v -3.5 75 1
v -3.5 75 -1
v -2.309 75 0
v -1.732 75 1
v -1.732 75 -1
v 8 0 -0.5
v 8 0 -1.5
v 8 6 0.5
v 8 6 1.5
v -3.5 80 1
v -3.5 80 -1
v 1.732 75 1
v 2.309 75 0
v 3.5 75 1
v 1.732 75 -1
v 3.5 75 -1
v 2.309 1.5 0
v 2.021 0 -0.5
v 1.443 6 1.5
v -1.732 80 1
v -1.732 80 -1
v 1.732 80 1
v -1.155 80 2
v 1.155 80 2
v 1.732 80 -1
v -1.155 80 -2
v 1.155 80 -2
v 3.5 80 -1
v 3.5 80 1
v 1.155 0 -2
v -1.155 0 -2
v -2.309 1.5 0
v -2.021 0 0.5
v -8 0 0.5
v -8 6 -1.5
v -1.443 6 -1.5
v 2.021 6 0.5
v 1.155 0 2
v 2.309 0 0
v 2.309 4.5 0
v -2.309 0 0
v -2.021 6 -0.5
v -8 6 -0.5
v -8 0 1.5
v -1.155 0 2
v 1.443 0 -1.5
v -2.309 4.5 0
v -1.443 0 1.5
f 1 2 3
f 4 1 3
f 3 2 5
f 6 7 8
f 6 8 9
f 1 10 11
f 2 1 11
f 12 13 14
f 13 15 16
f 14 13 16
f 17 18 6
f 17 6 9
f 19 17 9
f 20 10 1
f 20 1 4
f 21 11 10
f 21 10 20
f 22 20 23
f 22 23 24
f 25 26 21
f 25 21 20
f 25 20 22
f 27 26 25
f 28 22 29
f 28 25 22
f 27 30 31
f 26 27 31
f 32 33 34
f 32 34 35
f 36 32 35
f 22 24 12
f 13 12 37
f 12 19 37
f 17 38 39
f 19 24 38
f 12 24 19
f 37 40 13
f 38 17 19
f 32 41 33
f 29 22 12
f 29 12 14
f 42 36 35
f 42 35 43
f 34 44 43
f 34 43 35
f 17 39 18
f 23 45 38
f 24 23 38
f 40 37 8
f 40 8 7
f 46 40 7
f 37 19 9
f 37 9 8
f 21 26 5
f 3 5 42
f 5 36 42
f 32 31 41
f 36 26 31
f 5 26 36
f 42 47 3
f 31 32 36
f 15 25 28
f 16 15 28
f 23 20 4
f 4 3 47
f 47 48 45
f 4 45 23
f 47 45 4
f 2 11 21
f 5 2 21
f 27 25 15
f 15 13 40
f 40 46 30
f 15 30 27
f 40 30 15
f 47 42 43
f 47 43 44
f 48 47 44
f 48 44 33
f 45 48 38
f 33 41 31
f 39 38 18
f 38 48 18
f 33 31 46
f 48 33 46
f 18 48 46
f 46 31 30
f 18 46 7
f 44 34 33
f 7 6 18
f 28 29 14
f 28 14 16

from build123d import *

# Parameters (mm, degrees)
BOSS_EXTRUDE1_DEPTH = 80
SKETCH2_W           = 7
SKETCH2_H           = 2
BOSS_EXTRUDE2_DEPTH = 5
BOSS_EXTRUDE3_DEPTH = 8
BOSS_EXTRUDE4_DEPTH = 8


with BuildPart() as part:
    # Sketch1 → Boss-Extrude1 (new body)
    with BuildSketch(Plane(origin=(0, 0, 0), x_dir=(1, 0, 0), z_dir=(0, 1, 0))):
        Polygon((-1.154700538, 2), (-2.309401077, 0), (-1.154700538, -2), (1.154700538, -2), (2.309401077, 0), (1.154700538, 2), align=None)
    extrude(amount=BOSS_EXTRUDE1_DEPTH)

    # Sketch2 → Boss-Extrude2 (add)
    with BuildSketch(Plane(origin=(0, 80, 0), x_dir=(1, 0, 0), z_dir=(0, 1, 0))):
        Rectangle(SKETCH2_W, SKETCH2_H)
    extrude(amount=-BOSS_EXTRUDE2_DEPTH)

    # Sketch3 → Boss-Extrude3 (add)
    with BuildSketch(Plane(origin=(0, 0, 0), x_dir=(0, 0, -1), z_dir=(1, 0, 0))):
        Polygon((-1.5, 6), (-0.5, 6), (1.5, 0), (0.5, 0), align=None)
    extrude(amount=BOSS_EXTRUDE3_DEPTH)

    # Sketch4 → Boss-Extrude4 (add)
    with BuildSketch(Plane(origin=(0, 0, 0), x_dir=(0, 0, -1), z_dir=(1, 0, 0))):
        Polygon((1.5, 6), (0.5, 6), (-1.5, 0), (-0.5, 0), align=None)
    extrude(amount=-BOSS_EXTRUDE4_DEPTH)


solid = part.part
